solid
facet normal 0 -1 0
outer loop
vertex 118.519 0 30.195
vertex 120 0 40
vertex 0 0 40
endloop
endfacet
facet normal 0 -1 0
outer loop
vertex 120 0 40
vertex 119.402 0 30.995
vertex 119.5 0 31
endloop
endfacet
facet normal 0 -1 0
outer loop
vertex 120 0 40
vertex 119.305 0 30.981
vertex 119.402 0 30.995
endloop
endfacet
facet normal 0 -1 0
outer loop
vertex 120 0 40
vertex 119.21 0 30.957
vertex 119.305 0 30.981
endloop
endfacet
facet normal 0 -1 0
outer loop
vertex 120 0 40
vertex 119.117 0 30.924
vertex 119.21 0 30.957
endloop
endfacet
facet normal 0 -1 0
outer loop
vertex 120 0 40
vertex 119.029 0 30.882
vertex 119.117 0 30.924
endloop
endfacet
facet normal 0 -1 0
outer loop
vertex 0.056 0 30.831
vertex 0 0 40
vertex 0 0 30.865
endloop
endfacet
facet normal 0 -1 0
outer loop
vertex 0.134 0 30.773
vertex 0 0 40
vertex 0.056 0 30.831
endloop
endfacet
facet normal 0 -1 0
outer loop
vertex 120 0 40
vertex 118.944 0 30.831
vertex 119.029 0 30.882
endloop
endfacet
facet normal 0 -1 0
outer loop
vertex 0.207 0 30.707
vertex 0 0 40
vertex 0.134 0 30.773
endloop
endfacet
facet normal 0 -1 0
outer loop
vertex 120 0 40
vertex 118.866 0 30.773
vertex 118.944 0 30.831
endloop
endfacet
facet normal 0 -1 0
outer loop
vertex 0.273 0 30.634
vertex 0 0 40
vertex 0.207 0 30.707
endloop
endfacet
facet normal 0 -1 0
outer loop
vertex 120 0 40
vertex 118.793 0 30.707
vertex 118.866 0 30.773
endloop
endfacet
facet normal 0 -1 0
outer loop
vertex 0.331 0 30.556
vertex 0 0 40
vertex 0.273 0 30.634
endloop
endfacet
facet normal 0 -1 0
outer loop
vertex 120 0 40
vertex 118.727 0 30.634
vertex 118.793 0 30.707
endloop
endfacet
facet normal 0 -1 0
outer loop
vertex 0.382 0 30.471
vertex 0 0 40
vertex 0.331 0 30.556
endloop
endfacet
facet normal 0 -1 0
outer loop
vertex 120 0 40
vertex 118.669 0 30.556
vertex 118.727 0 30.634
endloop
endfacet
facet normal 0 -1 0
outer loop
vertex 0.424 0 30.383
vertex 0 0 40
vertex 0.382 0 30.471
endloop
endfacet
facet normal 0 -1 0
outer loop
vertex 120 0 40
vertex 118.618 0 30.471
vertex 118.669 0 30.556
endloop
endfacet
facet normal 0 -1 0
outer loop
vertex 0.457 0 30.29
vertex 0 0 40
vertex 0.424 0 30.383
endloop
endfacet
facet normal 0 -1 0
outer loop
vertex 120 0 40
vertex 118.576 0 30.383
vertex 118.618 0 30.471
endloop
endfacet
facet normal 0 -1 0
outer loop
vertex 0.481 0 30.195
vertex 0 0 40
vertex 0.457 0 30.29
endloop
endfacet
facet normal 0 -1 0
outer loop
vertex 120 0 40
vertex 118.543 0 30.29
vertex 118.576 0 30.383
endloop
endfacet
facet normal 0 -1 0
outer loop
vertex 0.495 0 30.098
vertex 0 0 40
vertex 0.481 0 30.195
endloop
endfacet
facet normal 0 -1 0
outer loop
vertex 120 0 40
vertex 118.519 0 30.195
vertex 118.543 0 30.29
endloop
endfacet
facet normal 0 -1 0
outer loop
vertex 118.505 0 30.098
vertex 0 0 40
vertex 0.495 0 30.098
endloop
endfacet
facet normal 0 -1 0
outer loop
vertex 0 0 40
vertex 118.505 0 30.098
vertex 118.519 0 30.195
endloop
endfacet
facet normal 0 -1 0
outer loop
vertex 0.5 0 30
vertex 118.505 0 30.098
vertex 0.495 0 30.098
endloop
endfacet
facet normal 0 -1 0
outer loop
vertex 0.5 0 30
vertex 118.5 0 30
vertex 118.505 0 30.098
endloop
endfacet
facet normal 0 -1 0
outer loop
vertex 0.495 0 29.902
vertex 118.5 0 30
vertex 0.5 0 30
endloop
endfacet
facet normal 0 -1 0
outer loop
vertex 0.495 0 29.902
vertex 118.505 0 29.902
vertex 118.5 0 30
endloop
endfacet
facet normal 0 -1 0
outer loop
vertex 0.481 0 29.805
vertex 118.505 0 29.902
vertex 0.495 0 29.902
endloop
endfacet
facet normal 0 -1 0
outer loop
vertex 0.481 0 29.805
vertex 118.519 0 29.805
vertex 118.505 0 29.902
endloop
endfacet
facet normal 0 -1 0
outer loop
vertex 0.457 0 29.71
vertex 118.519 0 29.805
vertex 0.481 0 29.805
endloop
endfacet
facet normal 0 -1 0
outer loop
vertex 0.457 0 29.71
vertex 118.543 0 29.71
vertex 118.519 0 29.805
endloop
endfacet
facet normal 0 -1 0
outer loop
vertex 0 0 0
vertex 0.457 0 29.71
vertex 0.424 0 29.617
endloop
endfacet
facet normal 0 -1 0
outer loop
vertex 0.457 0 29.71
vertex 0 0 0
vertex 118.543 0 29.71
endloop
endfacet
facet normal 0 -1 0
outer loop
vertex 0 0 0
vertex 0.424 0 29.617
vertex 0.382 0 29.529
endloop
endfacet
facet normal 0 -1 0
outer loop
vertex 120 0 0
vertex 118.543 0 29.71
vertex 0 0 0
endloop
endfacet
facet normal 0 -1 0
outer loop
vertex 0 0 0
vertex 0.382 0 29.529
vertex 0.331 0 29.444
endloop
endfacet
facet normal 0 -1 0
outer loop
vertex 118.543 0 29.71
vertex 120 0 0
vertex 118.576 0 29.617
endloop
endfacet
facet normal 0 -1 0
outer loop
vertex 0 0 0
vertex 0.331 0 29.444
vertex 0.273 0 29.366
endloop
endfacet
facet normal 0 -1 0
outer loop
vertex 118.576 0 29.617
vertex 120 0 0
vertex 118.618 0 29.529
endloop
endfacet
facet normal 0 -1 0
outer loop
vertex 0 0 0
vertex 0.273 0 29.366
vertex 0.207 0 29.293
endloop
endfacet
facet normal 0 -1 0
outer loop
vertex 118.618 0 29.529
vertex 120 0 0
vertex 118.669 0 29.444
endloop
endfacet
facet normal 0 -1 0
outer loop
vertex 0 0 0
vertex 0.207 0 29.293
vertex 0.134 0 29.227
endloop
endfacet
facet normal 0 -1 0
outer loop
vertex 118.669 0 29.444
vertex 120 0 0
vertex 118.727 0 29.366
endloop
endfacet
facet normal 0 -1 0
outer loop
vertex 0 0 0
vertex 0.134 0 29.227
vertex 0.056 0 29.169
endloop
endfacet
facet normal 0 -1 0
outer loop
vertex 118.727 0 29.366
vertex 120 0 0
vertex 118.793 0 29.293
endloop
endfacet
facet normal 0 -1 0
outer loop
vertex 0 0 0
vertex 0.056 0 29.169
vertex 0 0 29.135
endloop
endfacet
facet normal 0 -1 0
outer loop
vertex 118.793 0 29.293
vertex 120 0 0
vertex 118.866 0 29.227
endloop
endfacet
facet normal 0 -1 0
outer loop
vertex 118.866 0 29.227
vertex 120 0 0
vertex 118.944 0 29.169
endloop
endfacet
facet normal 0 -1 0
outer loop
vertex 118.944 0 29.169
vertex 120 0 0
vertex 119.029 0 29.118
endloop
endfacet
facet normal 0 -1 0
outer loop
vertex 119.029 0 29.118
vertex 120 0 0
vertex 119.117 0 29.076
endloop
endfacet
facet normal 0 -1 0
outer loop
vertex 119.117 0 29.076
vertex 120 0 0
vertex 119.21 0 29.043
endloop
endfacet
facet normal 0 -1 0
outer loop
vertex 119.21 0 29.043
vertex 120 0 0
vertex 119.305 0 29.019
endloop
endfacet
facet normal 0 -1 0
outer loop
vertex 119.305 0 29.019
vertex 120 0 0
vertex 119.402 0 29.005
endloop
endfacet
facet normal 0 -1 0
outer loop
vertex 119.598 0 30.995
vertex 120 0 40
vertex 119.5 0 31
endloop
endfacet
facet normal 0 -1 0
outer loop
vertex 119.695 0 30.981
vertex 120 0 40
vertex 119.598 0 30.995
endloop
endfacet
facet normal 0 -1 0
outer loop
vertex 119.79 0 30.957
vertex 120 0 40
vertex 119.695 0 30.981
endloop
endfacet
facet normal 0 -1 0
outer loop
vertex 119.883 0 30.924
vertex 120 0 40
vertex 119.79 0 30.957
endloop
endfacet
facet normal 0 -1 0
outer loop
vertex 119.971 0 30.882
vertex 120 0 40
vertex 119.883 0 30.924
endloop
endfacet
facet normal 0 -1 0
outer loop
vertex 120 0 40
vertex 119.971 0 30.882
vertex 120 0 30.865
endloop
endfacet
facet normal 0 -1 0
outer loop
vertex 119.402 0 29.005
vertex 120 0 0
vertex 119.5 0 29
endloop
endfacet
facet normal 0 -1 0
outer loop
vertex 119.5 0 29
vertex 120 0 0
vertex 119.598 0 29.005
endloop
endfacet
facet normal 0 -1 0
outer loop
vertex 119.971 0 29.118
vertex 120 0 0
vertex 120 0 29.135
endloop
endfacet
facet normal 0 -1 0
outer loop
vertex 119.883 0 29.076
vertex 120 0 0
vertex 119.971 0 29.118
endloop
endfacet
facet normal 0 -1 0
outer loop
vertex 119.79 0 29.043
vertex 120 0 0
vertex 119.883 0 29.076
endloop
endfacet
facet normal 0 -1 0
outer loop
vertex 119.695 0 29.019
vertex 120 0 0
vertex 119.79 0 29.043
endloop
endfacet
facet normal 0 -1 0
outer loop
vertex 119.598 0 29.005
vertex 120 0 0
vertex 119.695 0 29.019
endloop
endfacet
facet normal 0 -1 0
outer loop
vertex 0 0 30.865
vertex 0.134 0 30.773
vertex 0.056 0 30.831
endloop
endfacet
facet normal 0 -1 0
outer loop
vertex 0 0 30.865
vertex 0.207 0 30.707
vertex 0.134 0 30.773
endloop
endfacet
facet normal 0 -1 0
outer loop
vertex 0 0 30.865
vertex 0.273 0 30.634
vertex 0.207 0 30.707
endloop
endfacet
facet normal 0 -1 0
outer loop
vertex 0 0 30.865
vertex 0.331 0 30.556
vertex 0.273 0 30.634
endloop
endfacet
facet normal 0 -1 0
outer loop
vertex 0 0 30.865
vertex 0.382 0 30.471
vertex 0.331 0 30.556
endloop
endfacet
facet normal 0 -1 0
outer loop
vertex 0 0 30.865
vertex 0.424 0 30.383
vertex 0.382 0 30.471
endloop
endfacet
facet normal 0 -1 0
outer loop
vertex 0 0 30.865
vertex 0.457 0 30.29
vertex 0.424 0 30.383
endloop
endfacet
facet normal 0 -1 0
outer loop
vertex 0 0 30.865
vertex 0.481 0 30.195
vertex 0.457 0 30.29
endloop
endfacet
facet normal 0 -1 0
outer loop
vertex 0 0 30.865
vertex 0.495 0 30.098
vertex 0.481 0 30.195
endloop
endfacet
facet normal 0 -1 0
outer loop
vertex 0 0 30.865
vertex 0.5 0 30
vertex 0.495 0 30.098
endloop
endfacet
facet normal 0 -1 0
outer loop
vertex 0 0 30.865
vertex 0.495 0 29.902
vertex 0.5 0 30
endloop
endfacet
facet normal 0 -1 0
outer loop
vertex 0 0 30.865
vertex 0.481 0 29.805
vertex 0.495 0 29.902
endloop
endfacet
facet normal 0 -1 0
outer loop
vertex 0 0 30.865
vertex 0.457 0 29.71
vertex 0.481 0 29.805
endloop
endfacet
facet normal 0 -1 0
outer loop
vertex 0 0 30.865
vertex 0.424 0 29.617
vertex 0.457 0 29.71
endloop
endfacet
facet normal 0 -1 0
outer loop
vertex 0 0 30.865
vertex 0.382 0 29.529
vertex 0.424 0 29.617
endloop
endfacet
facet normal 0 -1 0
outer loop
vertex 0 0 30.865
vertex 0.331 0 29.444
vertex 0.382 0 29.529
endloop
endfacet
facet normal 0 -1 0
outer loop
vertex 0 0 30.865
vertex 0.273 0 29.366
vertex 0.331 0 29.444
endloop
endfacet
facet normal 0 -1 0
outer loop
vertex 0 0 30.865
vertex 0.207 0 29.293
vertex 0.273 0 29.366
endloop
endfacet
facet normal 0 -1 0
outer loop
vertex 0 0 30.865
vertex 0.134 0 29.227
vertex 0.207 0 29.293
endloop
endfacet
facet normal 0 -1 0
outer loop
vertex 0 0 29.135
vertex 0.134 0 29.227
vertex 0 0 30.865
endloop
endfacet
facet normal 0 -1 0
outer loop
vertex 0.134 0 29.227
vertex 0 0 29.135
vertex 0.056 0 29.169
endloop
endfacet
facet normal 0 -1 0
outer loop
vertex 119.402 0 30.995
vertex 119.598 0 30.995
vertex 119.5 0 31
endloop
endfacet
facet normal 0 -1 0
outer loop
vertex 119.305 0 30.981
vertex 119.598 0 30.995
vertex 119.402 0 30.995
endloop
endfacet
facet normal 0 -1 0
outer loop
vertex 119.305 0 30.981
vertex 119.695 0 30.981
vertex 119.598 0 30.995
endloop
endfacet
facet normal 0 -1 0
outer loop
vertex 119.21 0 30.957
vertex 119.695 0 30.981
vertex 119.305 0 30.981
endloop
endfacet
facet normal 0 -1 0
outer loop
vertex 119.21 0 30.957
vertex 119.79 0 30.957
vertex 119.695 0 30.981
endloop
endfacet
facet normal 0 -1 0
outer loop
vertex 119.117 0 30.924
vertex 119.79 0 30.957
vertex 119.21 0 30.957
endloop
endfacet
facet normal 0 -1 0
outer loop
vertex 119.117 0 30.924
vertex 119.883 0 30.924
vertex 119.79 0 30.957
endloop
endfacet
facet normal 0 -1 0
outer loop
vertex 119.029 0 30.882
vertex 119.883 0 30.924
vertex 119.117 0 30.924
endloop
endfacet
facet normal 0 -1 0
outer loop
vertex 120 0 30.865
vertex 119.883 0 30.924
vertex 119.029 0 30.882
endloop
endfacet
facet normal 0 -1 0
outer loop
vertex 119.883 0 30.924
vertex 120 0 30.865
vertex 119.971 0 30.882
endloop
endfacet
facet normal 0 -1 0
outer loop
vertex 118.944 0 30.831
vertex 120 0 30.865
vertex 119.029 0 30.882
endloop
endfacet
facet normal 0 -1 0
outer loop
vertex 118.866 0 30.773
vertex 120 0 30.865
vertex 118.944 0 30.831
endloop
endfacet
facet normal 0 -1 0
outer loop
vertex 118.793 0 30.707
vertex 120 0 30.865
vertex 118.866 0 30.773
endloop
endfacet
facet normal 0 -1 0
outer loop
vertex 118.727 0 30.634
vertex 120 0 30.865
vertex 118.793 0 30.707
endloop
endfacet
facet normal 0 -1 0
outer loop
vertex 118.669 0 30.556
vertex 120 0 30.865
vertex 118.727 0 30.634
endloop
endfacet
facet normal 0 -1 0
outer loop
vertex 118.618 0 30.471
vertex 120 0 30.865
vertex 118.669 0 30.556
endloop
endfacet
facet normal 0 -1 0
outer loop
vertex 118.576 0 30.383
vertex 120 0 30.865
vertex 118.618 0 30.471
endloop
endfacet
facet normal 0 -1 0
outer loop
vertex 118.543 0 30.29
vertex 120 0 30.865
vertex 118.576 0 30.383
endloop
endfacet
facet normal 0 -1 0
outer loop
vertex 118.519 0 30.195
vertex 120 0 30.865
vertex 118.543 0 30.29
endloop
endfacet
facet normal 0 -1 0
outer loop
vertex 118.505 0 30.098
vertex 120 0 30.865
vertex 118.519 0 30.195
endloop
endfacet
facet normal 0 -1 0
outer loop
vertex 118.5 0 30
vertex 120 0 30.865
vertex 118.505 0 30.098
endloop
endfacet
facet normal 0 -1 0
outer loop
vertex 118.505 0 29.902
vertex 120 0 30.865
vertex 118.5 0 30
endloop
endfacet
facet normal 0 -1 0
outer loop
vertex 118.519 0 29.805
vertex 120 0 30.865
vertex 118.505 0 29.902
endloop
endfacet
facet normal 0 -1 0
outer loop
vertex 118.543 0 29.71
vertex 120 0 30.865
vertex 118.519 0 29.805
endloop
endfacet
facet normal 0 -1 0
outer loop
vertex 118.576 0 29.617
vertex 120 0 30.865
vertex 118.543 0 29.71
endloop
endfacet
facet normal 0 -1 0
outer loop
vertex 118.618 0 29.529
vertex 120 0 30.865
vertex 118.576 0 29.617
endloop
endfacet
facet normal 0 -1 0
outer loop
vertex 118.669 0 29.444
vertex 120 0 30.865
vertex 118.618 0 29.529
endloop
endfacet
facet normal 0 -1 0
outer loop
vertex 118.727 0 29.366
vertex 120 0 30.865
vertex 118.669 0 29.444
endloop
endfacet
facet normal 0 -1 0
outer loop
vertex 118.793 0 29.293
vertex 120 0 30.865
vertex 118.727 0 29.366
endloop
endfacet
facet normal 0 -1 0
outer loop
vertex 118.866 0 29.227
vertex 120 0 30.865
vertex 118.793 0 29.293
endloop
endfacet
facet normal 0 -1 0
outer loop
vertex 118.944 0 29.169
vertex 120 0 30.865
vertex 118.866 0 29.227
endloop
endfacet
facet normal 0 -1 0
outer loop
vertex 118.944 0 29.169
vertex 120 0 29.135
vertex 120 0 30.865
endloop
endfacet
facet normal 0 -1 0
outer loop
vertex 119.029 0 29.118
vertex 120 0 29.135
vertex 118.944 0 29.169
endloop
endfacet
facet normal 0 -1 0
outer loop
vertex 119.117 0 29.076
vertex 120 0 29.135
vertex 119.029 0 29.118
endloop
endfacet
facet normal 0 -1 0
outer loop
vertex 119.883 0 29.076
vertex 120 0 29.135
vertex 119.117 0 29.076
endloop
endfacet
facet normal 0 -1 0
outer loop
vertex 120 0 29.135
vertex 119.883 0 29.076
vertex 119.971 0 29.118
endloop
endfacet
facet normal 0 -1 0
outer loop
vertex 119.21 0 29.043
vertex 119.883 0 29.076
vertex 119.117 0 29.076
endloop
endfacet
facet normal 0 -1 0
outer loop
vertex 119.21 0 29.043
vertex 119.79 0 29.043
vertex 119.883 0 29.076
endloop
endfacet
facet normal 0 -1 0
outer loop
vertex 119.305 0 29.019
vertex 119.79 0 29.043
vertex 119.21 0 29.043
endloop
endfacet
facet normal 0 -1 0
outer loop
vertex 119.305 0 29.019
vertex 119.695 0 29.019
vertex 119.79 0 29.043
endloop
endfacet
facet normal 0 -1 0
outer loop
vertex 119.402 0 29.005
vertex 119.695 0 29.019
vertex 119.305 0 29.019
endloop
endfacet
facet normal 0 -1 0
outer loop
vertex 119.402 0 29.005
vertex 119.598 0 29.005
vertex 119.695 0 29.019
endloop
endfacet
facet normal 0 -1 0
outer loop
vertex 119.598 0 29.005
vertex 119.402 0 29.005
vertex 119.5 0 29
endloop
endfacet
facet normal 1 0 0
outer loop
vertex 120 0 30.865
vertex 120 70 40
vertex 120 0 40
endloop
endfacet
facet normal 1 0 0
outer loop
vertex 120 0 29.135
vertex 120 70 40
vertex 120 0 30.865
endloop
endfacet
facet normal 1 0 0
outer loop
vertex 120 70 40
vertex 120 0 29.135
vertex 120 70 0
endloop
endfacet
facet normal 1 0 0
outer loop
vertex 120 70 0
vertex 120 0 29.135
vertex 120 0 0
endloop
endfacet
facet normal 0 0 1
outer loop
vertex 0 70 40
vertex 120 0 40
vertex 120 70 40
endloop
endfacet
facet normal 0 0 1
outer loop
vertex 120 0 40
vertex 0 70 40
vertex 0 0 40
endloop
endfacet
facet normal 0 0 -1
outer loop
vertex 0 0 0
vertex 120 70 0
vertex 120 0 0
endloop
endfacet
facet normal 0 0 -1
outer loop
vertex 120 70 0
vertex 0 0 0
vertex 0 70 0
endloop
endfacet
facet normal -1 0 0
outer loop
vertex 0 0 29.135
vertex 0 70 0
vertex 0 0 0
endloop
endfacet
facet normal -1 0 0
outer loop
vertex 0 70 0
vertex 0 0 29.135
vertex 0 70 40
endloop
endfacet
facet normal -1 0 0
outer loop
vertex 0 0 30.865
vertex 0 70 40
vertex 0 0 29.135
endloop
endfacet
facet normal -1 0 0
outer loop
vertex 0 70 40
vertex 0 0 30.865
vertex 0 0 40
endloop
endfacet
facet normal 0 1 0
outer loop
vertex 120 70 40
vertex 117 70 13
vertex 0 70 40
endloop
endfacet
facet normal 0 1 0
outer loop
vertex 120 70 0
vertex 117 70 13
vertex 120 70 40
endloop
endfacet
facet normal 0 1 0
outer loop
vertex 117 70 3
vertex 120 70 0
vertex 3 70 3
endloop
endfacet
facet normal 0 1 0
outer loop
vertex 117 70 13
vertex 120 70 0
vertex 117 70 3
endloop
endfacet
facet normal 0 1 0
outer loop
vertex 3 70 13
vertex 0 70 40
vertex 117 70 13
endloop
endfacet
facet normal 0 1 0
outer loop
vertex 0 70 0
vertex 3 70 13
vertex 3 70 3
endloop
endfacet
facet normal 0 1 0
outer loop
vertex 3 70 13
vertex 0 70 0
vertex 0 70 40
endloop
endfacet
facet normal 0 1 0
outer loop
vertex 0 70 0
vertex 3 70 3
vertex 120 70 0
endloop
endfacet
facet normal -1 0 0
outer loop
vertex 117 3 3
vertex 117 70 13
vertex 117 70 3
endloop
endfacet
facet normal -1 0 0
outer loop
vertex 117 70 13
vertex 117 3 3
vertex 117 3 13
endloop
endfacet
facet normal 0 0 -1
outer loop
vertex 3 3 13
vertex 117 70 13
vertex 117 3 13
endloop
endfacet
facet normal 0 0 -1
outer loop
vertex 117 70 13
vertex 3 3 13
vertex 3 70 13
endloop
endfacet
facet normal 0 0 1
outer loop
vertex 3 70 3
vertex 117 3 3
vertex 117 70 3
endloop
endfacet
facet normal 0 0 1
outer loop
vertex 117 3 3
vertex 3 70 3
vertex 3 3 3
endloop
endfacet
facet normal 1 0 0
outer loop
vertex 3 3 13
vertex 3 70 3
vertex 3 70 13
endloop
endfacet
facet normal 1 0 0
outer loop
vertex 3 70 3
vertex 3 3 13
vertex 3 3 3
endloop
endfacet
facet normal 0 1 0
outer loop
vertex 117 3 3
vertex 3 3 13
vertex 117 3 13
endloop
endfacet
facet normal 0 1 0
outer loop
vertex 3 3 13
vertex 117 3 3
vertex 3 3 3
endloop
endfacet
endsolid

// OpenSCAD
// Mini horizontal gel-electrophoresis box - buffer tank
// Print orientation: tank resting on XY plane, building up +Z

$fn = 64;

// ---- Tank dimensions ----
outer_x = 120;   // outer length in X
outer_y = 70;    // outer width in Y
outer_z = 40;    // outer height in Z
wall    = 3;     // wall thickness
floor   = 3;     // floor thickness

// ---- Platform dimensions ----
plat_x = 60;     // platform length in X (centred)
plat_y = outer_y; // platform spans full inner width
plat_top_z = 13; // top of platform (10 mm above inner floor)

// ---- Electrode holes ----
hole_d = 2;      // hole diameter
hole_y = 0;      // hole Y position
hole_z = 30;     // hole Z position

// ---- Derived ----
inner_x = outer_x - 2*wall;
inner_z = outer_z - floor;
eps = 0.5;       // cutter overshoot

difference() {
    // Tank body
    cube([outer_x, outer_y, outer_z]);

    // Gel tray cavity (open top)
    translate([wall, wall, floor])
        cube([inner_x, plat_y, plat_top_z - floor]);

    // Electrode holes through end walls
    for (sx = [-1, 1])
        translate([sx > 0 ? outer_x - eps : -eps, hole_y, hole_z])
            rotate([90, 0, 0])
                cylinder(d = hole_d, h = wall + eps);
}
